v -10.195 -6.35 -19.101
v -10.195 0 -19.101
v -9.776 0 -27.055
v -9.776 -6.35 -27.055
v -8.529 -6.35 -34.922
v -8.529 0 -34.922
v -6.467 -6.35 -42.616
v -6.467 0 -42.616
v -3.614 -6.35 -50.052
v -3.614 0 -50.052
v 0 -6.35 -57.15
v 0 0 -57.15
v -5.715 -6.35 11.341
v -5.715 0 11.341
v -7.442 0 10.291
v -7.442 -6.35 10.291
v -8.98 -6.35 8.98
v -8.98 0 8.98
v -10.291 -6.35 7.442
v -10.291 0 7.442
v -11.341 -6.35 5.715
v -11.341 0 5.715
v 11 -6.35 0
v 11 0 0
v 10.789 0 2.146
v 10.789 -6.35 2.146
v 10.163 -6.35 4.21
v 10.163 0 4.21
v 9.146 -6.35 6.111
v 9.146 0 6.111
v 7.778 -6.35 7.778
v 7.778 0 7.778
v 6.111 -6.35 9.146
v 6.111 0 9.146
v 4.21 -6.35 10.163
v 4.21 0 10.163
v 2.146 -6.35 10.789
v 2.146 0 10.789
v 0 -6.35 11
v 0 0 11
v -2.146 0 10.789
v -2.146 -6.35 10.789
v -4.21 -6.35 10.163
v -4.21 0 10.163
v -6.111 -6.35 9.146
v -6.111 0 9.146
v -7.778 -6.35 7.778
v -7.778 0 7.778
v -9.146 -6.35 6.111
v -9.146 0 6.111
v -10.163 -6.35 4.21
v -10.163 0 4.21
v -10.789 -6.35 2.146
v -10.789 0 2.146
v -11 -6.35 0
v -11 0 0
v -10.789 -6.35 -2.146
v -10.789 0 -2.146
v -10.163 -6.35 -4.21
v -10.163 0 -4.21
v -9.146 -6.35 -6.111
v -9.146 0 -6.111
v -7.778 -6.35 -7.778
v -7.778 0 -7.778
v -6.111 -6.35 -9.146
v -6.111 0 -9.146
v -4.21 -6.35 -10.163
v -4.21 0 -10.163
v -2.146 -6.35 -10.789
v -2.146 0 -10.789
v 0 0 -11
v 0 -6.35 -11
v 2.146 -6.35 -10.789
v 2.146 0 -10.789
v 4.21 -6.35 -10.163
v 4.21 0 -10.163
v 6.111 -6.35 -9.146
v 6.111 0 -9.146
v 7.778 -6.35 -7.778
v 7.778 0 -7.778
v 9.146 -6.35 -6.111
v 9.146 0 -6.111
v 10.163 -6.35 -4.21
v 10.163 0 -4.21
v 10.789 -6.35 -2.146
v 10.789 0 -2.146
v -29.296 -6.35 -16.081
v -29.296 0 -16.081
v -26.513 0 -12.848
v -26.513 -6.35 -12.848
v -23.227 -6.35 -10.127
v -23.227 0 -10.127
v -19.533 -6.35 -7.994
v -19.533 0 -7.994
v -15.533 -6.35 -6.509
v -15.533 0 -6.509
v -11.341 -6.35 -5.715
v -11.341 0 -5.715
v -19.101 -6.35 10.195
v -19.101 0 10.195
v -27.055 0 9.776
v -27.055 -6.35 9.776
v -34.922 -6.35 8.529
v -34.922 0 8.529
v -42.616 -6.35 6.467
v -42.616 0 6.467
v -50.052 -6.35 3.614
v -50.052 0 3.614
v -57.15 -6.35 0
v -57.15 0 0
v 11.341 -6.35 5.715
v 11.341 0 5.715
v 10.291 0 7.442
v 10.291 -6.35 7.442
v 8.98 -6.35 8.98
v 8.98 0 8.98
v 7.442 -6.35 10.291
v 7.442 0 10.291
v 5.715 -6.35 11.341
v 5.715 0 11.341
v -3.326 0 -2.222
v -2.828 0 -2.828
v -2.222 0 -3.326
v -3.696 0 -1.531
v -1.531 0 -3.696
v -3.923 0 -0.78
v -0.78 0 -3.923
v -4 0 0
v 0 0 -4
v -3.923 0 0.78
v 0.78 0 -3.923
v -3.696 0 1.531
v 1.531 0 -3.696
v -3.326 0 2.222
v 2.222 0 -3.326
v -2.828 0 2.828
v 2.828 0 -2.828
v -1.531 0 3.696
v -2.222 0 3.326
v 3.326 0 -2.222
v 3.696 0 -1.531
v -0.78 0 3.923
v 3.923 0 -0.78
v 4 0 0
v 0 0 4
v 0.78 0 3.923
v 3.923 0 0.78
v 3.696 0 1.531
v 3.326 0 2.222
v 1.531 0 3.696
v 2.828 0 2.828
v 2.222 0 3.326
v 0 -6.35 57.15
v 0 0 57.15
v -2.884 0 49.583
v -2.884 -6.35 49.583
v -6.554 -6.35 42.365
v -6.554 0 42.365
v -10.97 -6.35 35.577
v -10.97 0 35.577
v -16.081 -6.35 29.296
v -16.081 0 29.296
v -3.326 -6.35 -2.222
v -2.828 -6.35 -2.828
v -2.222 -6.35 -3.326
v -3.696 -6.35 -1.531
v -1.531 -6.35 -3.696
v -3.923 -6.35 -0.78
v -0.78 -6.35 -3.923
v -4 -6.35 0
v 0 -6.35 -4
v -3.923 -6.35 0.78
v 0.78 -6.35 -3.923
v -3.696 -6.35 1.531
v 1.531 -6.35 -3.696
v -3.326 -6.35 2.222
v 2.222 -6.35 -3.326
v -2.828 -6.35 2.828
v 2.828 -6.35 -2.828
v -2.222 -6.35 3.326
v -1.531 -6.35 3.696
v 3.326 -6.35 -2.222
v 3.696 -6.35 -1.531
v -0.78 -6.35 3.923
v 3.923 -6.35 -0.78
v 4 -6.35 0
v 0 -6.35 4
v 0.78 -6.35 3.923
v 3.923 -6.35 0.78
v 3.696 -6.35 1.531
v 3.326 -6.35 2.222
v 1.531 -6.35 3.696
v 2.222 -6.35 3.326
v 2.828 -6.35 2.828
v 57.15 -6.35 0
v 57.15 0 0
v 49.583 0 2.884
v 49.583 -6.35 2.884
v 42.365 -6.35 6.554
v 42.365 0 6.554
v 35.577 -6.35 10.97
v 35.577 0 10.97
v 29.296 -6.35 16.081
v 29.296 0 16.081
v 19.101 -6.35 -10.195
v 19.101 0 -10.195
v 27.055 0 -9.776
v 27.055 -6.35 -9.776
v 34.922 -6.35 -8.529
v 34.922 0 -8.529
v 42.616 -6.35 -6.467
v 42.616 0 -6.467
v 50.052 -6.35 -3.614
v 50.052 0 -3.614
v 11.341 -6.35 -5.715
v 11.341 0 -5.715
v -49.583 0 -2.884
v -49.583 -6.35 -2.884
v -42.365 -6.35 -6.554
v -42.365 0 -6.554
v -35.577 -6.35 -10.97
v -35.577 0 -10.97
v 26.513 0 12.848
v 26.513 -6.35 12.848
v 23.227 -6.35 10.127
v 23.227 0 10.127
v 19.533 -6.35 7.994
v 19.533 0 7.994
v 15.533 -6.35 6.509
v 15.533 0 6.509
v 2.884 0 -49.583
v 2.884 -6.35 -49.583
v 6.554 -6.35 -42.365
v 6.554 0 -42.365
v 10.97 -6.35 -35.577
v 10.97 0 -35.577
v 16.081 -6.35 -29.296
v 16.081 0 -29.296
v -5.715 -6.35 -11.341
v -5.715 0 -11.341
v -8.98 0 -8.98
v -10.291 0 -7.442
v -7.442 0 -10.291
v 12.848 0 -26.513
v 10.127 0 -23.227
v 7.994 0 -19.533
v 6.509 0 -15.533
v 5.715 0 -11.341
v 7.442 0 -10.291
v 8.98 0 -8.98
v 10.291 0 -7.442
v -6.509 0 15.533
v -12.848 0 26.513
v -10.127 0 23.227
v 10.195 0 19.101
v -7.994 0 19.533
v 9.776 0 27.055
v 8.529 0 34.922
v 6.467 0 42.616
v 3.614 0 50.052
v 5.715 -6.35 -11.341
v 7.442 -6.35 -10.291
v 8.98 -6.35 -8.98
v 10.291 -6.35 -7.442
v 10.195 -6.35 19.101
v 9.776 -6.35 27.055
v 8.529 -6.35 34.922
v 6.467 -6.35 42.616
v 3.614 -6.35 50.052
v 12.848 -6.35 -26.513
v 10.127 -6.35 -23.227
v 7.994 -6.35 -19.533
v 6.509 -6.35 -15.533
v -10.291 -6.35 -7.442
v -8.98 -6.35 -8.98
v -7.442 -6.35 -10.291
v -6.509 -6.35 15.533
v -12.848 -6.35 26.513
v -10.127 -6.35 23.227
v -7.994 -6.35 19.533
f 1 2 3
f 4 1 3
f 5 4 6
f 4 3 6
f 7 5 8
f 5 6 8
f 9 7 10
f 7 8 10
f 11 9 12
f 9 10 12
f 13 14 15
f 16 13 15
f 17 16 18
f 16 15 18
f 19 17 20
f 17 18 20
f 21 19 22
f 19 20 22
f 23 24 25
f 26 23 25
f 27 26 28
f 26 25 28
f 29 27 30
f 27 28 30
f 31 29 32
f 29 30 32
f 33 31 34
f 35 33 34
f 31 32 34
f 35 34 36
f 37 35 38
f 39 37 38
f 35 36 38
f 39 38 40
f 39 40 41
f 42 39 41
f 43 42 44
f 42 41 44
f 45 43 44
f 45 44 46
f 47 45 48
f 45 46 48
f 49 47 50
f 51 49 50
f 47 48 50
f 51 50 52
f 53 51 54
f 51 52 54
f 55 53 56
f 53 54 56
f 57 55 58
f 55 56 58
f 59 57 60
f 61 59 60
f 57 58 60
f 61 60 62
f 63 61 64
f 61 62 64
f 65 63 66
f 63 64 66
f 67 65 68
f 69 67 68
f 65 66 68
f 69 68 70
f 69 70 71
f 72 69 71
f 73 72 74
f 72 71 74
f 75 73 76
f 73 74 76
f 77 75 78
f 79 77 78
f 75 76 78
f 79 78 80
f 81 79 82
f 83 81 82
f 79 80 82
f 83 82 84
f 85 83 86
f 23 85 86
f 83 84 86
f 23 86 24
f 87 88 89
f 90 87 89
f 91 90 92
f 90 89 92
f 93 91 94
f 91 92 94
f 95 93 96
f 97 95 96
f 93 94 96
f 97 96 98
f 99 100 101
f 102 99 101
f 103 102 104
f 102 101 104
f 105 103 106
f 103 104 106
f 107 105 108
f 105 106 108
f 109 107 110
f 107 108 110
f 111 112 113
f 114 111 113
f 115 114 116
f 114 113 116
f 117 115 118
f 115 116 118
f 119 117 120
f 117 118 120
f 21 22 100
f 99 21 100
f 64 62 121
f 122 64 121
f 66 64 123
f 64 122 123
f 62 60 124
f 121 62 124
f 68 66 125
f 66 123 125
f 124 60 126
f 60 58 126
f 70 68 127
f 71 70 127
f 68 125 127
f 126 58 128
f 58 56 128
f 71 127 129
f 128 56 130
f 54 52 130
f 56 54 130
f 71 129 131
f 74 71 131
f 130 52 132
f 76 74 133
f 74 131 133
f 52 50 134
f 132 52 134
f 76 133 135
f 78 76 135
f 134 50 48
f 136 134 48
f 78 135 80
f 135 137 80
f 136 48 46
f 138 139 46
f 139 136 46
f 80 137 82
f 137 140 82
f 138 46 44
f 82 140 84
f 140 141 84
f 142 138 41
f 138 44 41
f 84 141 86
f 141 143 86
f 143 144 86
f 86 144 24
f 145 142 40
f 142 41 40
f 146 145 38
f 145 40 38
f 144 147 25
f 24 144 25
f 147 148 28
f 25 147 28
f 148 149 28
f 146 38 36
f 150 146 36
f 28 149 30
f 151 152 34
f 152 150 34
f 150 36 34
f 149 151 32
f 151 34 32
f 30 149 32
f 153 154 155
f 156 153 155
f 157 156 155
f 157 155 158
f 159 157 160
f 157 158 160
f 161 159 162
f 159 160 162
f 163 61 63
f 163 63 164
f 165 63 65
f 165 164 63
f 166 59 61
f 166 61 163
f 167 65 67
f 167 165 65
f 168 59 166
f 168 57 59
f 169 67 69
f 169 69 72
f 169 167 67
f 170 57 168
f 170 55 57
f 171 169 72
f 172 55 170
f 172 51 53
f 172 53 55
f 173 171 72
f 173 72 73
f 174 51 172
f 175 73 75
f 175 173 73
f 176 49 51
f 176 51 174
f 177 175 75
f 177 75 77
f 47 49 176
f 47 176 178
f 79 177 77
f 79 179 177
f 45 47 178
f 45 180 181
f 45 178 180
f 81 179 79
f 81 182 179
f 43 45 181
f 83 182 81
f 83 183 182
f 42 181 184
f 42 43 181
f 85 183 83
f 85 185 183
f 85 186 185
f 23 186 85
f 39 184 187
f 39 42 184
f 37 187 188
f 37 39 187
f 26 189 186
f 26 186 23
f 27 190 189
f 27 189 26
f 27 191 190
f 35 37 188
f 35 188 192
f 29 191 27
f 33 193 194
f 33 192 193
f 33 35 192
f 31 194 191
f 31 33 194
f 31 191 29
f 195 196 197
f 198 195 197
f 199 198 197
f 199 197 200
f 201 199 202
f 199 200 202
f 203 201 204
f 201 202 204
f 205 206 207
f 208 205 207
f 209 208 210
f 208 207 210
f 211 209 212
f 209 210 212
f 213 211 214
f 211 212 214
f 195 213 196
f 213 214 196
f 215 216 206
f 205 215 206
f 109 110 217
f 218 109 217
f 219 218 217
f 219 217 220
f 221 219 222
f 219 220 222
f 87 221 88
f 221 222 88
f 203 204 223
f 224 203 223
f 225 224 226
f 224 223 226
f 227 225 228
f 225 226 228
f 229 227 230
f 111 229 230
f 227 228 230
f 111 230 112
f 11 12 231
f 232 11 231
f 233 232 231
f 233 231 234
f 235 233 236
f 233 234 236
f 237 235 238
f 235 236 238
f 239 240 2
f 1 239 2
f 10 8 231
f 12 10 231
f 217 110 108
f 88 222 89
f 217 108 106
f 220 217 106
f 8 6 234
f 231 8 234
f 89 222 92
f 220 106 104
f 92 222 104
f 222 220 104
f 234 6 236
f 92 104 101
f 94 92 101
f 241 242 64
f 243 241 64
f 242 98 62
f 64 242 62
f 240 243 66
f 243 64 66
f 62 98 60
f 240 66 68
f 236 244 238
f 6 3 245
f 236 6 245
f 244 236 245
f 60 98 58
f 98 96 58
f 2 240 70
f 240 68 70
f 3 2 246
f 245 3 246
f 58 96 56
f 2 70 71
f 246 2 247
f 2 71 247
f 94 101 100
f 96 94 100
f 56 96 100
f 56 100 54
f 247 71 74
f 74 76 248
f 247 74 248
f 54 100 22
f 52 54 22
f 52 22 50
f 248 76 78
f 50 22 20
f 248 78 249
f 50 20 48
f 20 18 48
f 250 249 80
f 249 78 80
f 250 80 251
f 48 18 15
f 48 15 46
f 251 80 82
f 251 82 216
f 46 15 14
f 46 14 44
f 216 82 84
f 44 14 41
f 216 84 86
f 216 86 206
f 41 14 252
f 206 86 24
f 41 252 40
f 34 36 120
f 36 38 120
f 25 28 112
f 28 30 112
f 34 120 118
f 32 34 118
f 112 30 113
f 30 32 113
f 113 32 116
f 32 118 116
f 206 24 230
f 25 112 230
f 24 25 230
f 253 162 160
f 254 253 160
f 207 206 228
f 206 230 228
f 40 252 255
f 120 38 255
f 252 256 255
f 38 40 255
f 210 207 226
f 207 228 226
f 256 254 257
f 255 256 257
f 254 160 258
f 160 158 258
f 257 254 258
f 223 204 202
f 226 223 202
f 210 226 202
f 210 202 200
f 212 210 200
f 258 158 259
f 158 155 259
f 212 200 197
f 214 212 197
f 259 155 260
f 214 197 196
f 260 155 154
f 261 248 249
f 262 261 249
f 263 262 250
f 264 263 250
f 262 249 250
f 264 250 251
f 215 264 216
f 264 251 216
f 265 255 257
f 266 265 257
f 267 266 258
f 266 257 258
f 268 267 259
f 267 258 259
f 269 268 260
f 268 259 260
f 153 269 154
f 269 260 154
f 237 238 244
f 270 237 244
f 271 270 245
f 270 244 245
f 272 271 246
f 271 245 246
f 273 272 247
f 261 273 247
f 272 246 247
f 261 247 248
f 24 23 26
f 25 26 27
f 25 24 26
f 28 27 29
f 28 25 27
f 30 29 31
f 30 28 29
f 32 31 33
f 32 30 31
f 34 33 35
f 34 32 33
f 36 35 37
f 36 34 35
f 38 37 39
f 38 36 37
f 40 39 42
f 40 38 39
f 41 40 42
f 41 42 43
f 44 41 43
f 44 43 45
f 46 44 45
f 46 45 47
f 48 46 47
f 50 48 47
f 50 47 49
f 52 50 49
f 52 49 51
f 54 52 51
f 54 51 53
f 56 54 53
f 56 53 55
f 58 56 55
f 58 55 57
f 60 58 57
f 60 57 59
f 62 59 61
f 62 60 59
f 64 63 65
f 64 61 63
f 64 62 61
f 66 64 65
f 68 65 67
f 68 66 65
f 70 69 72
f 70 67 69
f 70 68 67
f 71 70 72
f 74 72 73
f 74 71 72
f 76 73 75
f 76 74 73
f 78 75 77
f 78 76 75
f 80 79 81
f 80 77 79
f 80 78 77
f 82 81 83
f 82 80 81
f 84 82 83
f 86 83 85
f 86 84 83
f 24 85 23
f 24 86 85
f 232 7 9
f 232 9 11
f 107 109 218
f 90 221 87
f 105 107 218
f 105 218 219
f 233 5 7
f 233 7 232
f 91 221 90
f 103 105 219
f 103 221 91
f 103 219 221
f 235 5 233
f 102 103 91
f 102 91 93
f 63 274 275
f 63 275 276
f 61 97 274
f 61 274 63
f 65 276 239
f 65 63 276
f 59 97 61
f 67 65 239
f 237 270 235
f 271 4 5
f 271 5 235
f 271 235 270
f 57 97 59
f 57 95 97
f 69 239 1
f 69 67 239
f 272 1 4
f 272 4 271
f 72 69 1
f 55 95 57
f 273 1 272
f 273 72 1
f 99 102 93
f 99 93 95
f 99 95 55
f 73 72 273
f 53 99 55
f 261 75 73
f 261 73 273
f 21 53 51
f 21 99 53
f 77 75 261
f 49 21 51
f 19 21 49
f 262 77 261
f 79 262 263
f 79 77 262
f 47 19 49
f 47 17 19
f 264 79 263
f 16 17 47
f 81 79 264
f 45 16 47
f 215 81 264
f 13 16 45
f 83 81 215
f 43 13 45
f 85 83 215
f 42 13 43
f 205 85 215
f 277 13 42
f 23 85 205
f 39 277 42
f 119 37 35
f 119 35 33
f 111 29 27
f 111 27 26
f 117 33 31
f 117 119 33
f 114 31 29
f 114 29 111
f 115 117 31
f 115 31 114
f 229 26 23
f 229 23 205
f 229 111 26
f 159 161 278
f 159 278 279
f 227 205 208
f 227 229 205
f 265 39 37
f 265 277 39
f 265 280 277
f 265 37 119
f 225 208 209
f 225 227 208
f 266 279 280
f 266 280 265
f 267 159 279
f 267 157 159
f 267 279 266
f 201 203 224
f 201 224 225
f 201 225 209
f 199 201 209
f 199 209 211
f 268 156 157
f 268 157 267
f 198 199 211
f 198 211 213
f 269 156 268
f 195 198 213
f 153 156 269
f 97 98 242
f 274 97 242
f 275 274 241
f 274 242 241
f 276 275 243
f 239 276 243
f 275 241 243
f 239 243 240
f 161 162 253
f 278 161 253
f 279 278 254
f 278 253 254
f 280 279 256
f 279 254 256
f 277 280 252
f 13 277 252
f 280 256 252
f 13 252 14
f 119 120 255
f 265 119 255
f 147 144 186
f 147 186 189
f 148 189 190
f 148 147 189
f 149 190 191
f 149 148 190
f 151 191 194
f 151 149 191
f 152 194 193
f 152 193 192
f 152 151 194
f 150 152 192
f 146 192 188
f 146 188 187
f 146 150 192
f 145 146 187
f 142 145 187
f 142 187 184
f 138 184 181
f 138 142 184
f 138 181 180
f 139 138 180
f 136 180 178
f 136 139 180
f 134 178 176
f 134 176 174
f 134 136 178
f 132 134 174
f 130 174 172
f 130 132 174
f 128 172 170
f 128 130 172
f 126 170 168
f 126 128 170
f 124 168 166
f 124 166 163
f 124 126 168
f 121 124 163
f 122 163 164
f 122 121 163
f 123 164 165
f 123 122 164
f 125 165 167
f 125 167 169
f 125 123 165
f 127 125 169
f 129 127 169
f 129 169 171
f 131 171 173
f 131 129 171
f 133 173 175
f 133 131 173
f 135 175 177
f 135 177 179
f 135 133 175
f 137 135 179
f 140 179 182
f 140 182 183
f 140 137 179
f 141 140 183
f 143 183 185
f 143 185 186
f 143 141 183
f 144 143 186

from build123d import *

# Parameters (mm, degrees)
F1_R     = 11
F2_DEPTH = 6.35
F3_COUNT = 4
F4_R     = 11
F4_R_2   = 4
F5_DEPTH = 6.35


with BuildPart() as f2:
    # F1 (on Front) → F2 (new body)
    with BuildSketch(Plane.XZ):
        with BuildLine():
            ThreePointArc((-5.715, 11.3414626482), (-6.6599361859, -10.8136603424), (12.7, 0))
            ThreePointArc((12.7, 0), (10.8136603424, 6.6599361859), (5.715, 11.3414626482))
            ThreePointArc((5.715, 11.3414626482), (0, 12.7), (-5.715, 11.3414626482))
        make_face()
        Circle(F1_R, mode=Mode.SUBTRACT)
        with BuildLine():
            ThreePointArc((-5.715, 11.3414626482), (0, 12.7), (5.715, 11.3414626482))
            Line((5.715, 11.3414626482), (10.1951265992, 19.1012695423))
            ThreePointArc((10.1951265992, 19.1012695423), (7.5986795153, 38.7958068413), (0, 57.15))
            ThreePointArc((0, 57.15), (-6.5543455598, 42.3650839343), (-16.0812856856, 29.2963961415))
            ThreePointArc((-16.0812856856, 29.2963961415), (-8.9828079425, 21.4247485151), (-5.715, 11.3414626482))
        make_face()
    extrude(amount=F2_DEPTH)

    # F3: F2 ×4 about axis
    f3_axis = Axis((0, -6.35, 0), (0, -1, 0))


with BuildPart() as f2_1:
    add(f2.part)
    for i in range(1, F3_COUNT):
        add(f2.part.rotate(f3_axis, i * 360 / F3_COUNT))


with BuildPart() as f5:
    # F4 (on Front) → F5 (new body)
    with BuildSketch(Plane.XZ):
        Circle(F4_R)
        Circle(F4_R_2, mode=Mode.SUBTRACT)
    extrude(amount=F5_DEPTH)


solid = Compound([f2_1.part, f5.part])
